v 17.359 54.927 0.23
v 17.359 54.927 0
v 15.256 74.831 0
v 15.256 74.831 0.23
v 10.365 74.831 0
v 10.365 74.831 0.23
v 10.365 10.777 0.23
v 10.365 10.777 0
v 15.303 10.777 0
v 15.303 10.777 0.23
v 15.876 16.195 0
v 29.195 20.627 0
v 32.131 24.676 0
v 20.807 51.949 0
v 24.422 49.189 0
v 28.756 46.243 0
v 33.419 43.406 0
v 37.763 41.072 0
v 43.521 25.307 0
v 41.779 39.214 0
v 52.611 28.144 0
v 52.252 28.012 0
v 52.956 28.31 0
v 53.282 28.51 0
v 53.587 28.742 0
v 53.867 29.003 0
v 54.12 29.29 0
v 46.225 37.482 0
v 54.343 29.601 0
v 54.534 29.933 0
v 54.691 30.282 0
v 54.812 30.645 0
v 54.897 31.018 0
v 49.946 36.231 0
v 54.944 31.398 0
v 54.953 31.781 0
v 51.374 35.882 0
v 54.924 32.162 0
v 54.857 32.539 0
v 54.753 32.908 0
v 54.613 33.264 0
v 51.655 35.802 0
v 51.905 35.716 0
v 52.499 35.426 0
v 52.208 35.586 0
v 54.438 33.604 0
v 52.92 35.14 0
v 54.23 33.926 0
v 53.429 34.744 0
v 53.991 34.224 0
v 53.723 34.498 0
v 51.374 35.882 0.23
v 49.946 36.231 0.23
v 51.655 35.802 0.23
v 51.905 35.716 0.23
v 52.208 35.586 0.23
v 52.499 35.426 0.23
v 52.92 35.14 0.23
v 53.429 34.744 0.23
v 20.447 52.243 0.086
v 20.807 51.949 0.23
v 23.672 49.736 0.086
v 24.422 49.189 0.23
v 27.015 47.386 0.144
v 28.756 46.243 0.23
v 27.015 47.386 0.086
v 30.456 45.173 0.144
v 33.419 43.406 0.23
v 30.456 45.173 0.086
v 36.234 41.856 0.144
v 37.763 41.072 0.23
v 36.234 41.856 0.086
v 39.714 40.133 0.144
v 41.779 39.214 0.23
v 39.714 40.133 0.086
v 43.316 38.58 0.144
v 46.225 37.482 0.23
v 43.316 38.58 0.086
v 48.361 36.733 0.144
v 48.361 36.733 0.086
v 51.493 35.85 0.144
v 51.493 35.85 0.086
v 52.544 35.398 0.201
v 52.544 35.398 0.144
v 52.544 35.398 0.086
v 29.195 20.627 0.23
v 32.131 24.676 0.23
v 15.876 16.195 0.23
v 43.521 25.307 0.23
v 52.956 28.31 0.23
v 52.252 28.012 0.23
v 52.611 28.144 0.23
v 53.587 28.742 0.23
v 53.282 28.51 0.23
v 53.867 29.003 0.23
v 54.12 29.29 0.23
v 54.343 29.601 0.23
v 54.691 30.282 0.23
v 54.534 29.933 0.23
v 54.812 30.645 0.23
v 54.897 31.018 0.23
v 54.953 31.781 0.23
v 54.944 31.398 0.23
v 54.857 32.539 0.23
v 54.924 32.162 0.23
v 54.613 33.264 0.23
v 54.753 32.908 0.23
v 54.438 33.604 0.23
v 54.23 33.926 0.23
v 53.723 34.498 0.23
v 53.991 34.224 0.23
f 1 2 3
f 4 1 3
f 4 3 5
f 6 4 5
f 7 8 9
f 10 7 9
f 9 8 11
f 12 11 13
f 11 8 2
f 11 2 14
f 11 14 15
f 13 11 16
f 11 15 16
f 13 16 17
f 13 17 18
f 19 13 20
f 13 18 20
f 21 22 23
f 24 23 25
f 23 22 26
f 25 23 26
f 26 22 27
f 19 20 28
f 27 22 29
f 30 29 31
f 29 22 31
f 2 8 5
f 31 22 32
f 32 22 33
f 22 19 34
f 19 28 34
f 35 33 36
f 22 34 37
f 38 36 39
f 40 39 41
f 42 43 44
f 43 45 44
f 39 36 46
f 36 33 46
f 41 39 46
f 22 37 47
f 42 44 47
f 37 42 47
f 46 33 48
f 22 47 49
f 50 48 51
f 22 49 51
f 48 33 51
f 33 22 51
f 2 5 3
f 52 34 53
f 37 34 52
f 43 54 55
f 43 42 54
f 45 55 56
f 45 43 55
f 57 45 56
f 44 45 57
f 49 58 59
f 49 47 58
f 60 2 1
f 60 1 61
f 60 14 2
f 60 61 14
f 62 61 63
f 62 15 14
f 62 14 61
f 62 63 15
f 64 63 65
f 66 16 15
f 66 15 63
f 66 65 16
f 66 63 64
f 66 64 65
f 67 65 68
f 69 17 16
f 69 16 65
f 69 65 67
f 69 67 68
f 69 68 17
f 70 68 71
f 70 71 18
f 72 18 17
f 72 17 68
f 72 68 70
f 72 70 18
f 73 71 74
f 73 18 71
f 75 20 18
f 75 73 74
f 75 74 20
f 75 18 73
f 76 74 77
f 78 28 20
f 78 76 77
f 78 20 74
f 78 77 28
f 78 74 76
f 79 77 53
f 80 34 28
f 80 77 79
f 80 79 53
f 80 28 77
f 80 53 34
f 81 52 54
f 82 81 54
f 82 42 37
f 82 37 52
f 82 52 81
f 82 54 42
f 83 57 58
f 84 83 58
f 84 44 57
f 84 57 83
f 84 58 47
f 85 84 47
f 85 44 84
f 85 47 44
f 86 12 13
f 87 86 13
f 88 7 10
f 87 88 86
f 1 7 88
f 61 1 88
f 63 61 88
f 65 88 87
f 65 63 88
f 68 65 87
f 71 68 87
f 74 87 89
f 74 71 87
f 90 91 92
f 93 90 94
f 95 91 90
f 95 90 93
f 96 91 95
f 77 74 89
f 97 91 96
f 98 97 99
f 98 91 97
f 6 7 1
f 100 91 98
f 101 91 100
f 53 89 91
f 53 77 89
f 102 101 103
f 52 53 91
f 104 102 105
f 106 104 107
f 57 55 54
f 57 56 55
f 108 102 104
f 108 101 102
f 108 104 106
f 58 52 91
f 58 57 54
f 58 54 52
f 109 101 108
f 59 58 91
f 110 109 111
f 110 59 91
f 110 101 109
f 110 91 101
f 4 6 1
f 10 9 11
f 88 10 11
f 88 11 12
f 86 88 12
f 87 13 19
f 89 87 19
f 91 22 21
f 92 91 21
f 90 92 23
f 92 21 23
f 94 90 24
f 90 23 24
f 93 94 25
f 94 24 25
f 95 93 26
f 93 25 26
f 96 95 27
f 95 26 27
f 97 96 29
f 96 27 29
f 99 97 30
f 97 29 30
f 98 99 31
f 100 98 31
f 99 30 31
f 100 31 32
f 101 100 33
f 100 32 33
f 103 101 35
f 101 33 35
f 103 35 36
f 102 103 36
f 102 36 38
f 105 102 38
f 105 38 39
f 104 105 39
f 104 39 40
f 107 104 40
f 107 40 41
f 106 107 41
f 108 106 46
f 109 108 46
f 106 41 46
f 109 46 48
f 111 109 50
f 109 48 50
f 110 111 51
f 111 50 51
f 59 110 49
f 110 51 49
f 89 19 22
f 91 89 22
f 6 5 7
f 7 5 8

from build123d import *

# Parameters (mm, degrees)
ESTRUSIONE_ESTRUSIONE1_DEPTH = 0.23


with BuildPart() as part:
    # Schizzo1 → Estrusione-Estrusione1 (new body)
    with BuildSketch(Plane.XY):
        with BuildLine():
            Line((10.365422141, 74.831373189), (10.365422141, 10.776707028))
            Line((10.365422141, 10.776707028), (15.302975319, 10.776707028))
            Line((15.302975319, 10.776707028), (15.876492425, 16.195196671))
            Line((15.876492425, 16.195196671), (29.195225145, 20.626716392))
            Line((29.195225145, 20.626716392), (32.131109214, 24.67621166))
            Line((32.131109214, 24.67621166), (43.520662662, 25.30654369))
            Line((43.520662662, 25.30654369), (52.251515817, 28.012420469))
            ThreePointArc((52.251515817, 28.012420469), (54.897133641, 31.018238504), (53.429432122, 34.743837514))
            add(Edge.make_bspline(
                [(17.359204401, 54.927140115), (21.375816351, 51.220919189), (27.618442159, 46.746271927), (36.534382122, 41.577775958), (42.465635871, 38.811252867), (47.453351059, 37.034127022), (49.931237279, 36.200286751), (51.283695675, 35.917869324), (52.269703163, 35.613114476), (52.708293272, 35.323272886), (53.429432122, 34.743837514)],
                knots=[0, 0, 0, 0, 0.391004562, 0.550370193, 0.736981075, 0.865480125, 0.91648803, 0.943203729, 0.951554926, 1, 1, 1, 1], degree=3))
            Line((17.359204401, 54.927140115), (15.256321742, 74.831373189))
            Line((15.256321742, 74.831373189), (10.365422141, 74.831373189))
        make_face()
    extrude(amount=ESTRUSIONE_ESTRUSIONE1_DEPTH)


solid = part.part
